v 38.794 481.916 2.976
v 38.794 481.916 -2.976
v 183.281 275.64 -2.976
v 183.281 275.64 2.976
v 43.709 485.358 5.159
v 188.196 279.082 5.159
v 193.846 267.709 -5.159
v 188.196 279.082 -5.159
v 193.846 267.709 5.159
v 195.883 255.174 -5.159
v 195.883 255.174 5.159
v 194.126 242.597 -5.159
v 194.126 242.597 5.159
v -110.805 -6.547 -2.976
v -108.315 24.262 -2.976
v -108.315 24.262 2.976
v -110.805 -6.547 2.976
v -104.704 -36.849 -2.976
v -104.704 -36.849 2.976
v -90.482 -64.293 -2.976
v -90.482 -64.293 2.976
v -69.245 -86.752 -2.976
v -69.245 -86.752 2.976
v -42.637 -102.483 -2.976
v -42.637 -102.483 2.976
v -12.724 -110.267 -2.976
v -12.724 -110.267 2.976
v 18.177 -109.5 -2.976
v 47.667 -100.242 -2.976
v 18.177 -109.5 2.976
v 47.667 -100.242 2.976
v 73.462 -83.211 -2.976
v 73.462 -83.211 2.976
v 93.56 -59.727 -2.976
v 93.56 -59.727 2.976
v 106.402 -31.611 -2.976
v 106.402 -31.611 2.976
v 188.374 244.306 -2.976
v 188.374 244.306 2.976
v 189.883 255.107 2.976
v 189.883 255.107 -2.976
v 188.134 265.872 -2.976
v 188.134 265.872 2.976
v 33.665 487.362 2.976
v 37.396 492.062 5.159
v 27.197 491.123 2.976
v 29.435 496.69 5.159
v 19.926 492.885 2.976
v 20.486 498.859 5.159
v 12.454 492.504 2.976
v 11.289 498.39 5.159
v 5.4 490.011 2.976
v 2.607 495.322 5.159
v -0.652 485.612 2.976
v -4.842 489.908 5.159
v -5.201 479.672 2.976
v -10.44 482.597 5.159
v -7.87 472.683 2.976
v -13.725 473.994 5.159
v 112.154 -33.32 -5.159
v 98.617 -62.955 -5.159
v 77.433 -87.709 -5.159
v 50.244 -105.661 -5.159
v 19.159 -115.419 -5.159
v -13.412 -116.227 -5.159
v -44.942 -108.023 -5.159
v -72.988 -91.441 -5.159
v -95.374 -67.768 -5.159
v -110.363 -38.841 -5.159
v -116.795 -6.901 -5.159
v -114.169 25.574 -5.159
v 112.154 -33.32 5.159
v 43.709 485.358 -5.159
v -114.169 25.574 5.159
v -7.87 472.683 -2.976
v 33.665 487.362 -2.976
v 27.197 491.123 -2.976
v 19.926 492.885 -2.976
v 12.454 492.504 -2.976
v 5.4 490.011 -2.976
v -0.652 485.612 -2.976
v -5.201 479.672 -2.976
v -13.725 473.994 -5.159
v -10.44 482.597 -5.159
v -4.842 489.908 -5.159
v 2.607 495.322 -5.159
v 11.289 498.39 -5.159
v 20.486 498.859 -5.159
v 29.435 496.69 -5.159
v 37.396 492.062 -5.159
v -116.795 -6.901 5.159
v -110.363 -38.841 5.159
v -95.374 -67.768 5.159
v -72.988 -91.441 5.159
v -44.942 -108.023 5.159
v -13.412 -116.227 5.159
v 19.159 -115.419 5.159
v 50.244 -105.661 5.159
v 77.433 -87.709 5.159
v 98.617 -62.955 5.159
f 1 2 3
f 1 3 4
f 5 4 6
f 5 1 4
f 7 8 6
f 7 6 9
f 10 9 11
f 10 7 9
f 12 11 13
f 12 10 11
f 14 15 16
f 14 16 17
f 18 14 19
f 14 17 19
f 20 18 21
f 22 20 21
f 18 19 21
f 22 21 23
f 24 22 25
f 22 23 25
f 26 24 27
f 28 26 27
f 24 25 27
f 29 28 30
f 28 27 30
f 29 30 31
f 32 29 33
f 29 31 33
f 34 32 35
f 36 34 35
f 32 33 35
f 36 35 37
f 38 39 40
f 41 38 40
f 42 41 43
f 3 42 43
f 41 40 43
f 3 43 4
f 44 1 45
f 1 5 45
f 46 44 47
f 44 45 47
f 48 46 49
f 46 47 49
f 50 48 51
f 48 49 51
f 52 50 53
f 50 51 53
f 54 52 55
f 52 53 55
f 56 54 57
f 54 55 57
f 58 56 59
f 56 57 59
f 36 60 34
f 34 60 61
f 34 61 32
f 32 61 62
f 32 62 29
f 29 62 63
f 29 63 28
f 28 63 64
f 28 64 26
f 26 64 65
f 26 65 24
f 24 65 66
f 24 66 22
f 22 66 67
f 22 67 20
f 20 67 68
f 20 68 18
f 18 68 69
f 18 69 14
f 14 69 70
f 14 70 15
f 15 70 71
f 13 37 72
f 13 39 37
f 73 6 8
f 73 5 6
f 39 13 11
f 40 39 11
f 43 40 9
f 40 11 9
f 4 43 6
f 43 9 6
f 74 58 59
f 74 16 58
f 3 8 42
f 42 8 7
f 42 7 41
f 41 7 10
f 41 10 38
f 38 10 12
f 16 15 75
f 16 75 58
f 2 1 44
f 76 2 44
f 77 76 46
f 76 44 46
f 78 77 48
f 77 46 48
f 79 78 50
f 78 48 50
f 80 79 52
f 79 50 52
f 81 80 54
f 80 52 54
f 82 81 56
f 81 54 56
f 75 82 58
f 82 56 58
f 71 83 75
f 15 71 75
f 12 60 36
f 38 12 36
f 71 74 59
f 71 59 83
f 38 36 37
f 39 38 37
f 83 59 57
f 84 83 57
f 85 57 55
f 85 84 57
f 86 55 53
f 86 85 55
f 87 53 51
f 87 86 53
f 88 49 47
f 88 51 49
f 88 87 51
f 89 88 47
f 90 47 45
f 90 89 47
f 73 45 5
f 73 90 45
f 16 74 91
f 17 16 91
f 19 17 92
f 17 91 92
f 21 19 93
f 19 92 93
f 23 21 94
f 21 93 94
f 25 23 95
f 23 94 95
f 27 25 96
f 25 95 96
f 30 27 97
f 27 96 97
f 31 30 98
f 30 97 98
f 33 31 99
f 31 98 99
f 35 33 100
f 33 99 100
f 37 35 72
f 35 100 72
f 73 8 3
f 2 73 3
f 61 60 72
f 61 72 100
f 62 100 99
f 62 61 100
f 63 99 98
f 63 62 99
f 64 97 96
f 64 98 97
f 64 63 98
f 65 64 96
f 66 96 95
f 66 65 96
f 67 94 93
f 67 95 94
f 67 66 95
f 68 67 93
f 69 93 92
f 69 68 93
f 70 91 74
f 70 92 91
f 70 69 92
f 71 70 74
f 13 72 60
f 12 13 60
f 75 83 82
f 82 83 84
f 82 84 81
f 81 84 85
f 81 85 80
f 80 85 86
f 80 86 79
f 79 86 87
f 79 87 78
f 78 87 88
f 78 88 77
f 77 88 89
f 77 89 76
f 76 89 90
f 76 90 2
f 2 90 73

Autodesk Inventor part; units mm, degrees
ref_plane "YZ Plane" through (0, 0, 0) normal (1, 0, 0) x (0, 1, 0)
ref_plane "XZ Plane" through (0, 0, 0) normal (0, 1, 0) x (-1, 0, 0)
sketch "Chemin d'esquisse" plane through (0, 0, 0) normal (0, 0, 1) x (1, 0, 0)
  arc A0 (-111.7313, 25.0274) -> (109.7586, -32.6082) centre (0, 0) ccw
  arc A1 (41.6622, 483.9245) -> (-11.2867, 473.4481) centre (17.5, 467) ccw
  arc A2 (191.7306, 243.3084) -> (186.1492, 277.6484) centre (153.387, 254.6999) ccw
  line L0 (191.7306, 243.3084) -> (109.7586, -32.6082)
  line L1 (-111.7313, 25.0274) -> (-11.2867, 473.4481)
  line L2 (41.6622, 483.9245) -> (186.1492, 277.6484)
ref_plane "Plan de section" through (109.7586, -32.6082, 0) normal (0.2848, 0.9586, 0) x (0, 0, 1)
sketch "Section" plane through (109.7586, -32.6082, 0) normal (0.2848, 0.9586, 0) x (0, 0, 1)
  line L0 (0, 2.4986) -> (0, -3.5014) construction
  line L1 (-4.25, 0) -> (4.25, 0) construction
  line L2 (-5.1594, 2.4986) -> (5.1594, 2.4986)
  line L3 (5.1594, 2.4986) -> (2.9756, -3.5014)
  line L4 (2.9756, -3.5014) -> (-2.9756, -3.5014)
  line L5 (-2.9756, -3.5014) -> (-5.1594, 2.4986)
  point P0 (0, 0)
  point P1 (0, 0)
  point P2 (0, 0)
  dimension "d0" = 8.5
  dimension "d1" = 2.4986
  dimension "d2" = 40
  dimension "d3" = 6
sweep "Courroie" add profiles "Section" path "Chemin d'esquisse"
equation "\"d0\" = da_Bw"
equation "\"d1\" = da_Hw"
equation "\"d2\" = da_Alfa"
equation "\"d3\" = da_H"
equation "\"da_Alfa\" = 40deg"
equation "\"da_H\" = 6"
equation "\"da_Bw\" = 8.5"
equation "\"da_Hw\" = 2.49859"
properties part number "Courroie trapézoïdale" material "Rubber"
